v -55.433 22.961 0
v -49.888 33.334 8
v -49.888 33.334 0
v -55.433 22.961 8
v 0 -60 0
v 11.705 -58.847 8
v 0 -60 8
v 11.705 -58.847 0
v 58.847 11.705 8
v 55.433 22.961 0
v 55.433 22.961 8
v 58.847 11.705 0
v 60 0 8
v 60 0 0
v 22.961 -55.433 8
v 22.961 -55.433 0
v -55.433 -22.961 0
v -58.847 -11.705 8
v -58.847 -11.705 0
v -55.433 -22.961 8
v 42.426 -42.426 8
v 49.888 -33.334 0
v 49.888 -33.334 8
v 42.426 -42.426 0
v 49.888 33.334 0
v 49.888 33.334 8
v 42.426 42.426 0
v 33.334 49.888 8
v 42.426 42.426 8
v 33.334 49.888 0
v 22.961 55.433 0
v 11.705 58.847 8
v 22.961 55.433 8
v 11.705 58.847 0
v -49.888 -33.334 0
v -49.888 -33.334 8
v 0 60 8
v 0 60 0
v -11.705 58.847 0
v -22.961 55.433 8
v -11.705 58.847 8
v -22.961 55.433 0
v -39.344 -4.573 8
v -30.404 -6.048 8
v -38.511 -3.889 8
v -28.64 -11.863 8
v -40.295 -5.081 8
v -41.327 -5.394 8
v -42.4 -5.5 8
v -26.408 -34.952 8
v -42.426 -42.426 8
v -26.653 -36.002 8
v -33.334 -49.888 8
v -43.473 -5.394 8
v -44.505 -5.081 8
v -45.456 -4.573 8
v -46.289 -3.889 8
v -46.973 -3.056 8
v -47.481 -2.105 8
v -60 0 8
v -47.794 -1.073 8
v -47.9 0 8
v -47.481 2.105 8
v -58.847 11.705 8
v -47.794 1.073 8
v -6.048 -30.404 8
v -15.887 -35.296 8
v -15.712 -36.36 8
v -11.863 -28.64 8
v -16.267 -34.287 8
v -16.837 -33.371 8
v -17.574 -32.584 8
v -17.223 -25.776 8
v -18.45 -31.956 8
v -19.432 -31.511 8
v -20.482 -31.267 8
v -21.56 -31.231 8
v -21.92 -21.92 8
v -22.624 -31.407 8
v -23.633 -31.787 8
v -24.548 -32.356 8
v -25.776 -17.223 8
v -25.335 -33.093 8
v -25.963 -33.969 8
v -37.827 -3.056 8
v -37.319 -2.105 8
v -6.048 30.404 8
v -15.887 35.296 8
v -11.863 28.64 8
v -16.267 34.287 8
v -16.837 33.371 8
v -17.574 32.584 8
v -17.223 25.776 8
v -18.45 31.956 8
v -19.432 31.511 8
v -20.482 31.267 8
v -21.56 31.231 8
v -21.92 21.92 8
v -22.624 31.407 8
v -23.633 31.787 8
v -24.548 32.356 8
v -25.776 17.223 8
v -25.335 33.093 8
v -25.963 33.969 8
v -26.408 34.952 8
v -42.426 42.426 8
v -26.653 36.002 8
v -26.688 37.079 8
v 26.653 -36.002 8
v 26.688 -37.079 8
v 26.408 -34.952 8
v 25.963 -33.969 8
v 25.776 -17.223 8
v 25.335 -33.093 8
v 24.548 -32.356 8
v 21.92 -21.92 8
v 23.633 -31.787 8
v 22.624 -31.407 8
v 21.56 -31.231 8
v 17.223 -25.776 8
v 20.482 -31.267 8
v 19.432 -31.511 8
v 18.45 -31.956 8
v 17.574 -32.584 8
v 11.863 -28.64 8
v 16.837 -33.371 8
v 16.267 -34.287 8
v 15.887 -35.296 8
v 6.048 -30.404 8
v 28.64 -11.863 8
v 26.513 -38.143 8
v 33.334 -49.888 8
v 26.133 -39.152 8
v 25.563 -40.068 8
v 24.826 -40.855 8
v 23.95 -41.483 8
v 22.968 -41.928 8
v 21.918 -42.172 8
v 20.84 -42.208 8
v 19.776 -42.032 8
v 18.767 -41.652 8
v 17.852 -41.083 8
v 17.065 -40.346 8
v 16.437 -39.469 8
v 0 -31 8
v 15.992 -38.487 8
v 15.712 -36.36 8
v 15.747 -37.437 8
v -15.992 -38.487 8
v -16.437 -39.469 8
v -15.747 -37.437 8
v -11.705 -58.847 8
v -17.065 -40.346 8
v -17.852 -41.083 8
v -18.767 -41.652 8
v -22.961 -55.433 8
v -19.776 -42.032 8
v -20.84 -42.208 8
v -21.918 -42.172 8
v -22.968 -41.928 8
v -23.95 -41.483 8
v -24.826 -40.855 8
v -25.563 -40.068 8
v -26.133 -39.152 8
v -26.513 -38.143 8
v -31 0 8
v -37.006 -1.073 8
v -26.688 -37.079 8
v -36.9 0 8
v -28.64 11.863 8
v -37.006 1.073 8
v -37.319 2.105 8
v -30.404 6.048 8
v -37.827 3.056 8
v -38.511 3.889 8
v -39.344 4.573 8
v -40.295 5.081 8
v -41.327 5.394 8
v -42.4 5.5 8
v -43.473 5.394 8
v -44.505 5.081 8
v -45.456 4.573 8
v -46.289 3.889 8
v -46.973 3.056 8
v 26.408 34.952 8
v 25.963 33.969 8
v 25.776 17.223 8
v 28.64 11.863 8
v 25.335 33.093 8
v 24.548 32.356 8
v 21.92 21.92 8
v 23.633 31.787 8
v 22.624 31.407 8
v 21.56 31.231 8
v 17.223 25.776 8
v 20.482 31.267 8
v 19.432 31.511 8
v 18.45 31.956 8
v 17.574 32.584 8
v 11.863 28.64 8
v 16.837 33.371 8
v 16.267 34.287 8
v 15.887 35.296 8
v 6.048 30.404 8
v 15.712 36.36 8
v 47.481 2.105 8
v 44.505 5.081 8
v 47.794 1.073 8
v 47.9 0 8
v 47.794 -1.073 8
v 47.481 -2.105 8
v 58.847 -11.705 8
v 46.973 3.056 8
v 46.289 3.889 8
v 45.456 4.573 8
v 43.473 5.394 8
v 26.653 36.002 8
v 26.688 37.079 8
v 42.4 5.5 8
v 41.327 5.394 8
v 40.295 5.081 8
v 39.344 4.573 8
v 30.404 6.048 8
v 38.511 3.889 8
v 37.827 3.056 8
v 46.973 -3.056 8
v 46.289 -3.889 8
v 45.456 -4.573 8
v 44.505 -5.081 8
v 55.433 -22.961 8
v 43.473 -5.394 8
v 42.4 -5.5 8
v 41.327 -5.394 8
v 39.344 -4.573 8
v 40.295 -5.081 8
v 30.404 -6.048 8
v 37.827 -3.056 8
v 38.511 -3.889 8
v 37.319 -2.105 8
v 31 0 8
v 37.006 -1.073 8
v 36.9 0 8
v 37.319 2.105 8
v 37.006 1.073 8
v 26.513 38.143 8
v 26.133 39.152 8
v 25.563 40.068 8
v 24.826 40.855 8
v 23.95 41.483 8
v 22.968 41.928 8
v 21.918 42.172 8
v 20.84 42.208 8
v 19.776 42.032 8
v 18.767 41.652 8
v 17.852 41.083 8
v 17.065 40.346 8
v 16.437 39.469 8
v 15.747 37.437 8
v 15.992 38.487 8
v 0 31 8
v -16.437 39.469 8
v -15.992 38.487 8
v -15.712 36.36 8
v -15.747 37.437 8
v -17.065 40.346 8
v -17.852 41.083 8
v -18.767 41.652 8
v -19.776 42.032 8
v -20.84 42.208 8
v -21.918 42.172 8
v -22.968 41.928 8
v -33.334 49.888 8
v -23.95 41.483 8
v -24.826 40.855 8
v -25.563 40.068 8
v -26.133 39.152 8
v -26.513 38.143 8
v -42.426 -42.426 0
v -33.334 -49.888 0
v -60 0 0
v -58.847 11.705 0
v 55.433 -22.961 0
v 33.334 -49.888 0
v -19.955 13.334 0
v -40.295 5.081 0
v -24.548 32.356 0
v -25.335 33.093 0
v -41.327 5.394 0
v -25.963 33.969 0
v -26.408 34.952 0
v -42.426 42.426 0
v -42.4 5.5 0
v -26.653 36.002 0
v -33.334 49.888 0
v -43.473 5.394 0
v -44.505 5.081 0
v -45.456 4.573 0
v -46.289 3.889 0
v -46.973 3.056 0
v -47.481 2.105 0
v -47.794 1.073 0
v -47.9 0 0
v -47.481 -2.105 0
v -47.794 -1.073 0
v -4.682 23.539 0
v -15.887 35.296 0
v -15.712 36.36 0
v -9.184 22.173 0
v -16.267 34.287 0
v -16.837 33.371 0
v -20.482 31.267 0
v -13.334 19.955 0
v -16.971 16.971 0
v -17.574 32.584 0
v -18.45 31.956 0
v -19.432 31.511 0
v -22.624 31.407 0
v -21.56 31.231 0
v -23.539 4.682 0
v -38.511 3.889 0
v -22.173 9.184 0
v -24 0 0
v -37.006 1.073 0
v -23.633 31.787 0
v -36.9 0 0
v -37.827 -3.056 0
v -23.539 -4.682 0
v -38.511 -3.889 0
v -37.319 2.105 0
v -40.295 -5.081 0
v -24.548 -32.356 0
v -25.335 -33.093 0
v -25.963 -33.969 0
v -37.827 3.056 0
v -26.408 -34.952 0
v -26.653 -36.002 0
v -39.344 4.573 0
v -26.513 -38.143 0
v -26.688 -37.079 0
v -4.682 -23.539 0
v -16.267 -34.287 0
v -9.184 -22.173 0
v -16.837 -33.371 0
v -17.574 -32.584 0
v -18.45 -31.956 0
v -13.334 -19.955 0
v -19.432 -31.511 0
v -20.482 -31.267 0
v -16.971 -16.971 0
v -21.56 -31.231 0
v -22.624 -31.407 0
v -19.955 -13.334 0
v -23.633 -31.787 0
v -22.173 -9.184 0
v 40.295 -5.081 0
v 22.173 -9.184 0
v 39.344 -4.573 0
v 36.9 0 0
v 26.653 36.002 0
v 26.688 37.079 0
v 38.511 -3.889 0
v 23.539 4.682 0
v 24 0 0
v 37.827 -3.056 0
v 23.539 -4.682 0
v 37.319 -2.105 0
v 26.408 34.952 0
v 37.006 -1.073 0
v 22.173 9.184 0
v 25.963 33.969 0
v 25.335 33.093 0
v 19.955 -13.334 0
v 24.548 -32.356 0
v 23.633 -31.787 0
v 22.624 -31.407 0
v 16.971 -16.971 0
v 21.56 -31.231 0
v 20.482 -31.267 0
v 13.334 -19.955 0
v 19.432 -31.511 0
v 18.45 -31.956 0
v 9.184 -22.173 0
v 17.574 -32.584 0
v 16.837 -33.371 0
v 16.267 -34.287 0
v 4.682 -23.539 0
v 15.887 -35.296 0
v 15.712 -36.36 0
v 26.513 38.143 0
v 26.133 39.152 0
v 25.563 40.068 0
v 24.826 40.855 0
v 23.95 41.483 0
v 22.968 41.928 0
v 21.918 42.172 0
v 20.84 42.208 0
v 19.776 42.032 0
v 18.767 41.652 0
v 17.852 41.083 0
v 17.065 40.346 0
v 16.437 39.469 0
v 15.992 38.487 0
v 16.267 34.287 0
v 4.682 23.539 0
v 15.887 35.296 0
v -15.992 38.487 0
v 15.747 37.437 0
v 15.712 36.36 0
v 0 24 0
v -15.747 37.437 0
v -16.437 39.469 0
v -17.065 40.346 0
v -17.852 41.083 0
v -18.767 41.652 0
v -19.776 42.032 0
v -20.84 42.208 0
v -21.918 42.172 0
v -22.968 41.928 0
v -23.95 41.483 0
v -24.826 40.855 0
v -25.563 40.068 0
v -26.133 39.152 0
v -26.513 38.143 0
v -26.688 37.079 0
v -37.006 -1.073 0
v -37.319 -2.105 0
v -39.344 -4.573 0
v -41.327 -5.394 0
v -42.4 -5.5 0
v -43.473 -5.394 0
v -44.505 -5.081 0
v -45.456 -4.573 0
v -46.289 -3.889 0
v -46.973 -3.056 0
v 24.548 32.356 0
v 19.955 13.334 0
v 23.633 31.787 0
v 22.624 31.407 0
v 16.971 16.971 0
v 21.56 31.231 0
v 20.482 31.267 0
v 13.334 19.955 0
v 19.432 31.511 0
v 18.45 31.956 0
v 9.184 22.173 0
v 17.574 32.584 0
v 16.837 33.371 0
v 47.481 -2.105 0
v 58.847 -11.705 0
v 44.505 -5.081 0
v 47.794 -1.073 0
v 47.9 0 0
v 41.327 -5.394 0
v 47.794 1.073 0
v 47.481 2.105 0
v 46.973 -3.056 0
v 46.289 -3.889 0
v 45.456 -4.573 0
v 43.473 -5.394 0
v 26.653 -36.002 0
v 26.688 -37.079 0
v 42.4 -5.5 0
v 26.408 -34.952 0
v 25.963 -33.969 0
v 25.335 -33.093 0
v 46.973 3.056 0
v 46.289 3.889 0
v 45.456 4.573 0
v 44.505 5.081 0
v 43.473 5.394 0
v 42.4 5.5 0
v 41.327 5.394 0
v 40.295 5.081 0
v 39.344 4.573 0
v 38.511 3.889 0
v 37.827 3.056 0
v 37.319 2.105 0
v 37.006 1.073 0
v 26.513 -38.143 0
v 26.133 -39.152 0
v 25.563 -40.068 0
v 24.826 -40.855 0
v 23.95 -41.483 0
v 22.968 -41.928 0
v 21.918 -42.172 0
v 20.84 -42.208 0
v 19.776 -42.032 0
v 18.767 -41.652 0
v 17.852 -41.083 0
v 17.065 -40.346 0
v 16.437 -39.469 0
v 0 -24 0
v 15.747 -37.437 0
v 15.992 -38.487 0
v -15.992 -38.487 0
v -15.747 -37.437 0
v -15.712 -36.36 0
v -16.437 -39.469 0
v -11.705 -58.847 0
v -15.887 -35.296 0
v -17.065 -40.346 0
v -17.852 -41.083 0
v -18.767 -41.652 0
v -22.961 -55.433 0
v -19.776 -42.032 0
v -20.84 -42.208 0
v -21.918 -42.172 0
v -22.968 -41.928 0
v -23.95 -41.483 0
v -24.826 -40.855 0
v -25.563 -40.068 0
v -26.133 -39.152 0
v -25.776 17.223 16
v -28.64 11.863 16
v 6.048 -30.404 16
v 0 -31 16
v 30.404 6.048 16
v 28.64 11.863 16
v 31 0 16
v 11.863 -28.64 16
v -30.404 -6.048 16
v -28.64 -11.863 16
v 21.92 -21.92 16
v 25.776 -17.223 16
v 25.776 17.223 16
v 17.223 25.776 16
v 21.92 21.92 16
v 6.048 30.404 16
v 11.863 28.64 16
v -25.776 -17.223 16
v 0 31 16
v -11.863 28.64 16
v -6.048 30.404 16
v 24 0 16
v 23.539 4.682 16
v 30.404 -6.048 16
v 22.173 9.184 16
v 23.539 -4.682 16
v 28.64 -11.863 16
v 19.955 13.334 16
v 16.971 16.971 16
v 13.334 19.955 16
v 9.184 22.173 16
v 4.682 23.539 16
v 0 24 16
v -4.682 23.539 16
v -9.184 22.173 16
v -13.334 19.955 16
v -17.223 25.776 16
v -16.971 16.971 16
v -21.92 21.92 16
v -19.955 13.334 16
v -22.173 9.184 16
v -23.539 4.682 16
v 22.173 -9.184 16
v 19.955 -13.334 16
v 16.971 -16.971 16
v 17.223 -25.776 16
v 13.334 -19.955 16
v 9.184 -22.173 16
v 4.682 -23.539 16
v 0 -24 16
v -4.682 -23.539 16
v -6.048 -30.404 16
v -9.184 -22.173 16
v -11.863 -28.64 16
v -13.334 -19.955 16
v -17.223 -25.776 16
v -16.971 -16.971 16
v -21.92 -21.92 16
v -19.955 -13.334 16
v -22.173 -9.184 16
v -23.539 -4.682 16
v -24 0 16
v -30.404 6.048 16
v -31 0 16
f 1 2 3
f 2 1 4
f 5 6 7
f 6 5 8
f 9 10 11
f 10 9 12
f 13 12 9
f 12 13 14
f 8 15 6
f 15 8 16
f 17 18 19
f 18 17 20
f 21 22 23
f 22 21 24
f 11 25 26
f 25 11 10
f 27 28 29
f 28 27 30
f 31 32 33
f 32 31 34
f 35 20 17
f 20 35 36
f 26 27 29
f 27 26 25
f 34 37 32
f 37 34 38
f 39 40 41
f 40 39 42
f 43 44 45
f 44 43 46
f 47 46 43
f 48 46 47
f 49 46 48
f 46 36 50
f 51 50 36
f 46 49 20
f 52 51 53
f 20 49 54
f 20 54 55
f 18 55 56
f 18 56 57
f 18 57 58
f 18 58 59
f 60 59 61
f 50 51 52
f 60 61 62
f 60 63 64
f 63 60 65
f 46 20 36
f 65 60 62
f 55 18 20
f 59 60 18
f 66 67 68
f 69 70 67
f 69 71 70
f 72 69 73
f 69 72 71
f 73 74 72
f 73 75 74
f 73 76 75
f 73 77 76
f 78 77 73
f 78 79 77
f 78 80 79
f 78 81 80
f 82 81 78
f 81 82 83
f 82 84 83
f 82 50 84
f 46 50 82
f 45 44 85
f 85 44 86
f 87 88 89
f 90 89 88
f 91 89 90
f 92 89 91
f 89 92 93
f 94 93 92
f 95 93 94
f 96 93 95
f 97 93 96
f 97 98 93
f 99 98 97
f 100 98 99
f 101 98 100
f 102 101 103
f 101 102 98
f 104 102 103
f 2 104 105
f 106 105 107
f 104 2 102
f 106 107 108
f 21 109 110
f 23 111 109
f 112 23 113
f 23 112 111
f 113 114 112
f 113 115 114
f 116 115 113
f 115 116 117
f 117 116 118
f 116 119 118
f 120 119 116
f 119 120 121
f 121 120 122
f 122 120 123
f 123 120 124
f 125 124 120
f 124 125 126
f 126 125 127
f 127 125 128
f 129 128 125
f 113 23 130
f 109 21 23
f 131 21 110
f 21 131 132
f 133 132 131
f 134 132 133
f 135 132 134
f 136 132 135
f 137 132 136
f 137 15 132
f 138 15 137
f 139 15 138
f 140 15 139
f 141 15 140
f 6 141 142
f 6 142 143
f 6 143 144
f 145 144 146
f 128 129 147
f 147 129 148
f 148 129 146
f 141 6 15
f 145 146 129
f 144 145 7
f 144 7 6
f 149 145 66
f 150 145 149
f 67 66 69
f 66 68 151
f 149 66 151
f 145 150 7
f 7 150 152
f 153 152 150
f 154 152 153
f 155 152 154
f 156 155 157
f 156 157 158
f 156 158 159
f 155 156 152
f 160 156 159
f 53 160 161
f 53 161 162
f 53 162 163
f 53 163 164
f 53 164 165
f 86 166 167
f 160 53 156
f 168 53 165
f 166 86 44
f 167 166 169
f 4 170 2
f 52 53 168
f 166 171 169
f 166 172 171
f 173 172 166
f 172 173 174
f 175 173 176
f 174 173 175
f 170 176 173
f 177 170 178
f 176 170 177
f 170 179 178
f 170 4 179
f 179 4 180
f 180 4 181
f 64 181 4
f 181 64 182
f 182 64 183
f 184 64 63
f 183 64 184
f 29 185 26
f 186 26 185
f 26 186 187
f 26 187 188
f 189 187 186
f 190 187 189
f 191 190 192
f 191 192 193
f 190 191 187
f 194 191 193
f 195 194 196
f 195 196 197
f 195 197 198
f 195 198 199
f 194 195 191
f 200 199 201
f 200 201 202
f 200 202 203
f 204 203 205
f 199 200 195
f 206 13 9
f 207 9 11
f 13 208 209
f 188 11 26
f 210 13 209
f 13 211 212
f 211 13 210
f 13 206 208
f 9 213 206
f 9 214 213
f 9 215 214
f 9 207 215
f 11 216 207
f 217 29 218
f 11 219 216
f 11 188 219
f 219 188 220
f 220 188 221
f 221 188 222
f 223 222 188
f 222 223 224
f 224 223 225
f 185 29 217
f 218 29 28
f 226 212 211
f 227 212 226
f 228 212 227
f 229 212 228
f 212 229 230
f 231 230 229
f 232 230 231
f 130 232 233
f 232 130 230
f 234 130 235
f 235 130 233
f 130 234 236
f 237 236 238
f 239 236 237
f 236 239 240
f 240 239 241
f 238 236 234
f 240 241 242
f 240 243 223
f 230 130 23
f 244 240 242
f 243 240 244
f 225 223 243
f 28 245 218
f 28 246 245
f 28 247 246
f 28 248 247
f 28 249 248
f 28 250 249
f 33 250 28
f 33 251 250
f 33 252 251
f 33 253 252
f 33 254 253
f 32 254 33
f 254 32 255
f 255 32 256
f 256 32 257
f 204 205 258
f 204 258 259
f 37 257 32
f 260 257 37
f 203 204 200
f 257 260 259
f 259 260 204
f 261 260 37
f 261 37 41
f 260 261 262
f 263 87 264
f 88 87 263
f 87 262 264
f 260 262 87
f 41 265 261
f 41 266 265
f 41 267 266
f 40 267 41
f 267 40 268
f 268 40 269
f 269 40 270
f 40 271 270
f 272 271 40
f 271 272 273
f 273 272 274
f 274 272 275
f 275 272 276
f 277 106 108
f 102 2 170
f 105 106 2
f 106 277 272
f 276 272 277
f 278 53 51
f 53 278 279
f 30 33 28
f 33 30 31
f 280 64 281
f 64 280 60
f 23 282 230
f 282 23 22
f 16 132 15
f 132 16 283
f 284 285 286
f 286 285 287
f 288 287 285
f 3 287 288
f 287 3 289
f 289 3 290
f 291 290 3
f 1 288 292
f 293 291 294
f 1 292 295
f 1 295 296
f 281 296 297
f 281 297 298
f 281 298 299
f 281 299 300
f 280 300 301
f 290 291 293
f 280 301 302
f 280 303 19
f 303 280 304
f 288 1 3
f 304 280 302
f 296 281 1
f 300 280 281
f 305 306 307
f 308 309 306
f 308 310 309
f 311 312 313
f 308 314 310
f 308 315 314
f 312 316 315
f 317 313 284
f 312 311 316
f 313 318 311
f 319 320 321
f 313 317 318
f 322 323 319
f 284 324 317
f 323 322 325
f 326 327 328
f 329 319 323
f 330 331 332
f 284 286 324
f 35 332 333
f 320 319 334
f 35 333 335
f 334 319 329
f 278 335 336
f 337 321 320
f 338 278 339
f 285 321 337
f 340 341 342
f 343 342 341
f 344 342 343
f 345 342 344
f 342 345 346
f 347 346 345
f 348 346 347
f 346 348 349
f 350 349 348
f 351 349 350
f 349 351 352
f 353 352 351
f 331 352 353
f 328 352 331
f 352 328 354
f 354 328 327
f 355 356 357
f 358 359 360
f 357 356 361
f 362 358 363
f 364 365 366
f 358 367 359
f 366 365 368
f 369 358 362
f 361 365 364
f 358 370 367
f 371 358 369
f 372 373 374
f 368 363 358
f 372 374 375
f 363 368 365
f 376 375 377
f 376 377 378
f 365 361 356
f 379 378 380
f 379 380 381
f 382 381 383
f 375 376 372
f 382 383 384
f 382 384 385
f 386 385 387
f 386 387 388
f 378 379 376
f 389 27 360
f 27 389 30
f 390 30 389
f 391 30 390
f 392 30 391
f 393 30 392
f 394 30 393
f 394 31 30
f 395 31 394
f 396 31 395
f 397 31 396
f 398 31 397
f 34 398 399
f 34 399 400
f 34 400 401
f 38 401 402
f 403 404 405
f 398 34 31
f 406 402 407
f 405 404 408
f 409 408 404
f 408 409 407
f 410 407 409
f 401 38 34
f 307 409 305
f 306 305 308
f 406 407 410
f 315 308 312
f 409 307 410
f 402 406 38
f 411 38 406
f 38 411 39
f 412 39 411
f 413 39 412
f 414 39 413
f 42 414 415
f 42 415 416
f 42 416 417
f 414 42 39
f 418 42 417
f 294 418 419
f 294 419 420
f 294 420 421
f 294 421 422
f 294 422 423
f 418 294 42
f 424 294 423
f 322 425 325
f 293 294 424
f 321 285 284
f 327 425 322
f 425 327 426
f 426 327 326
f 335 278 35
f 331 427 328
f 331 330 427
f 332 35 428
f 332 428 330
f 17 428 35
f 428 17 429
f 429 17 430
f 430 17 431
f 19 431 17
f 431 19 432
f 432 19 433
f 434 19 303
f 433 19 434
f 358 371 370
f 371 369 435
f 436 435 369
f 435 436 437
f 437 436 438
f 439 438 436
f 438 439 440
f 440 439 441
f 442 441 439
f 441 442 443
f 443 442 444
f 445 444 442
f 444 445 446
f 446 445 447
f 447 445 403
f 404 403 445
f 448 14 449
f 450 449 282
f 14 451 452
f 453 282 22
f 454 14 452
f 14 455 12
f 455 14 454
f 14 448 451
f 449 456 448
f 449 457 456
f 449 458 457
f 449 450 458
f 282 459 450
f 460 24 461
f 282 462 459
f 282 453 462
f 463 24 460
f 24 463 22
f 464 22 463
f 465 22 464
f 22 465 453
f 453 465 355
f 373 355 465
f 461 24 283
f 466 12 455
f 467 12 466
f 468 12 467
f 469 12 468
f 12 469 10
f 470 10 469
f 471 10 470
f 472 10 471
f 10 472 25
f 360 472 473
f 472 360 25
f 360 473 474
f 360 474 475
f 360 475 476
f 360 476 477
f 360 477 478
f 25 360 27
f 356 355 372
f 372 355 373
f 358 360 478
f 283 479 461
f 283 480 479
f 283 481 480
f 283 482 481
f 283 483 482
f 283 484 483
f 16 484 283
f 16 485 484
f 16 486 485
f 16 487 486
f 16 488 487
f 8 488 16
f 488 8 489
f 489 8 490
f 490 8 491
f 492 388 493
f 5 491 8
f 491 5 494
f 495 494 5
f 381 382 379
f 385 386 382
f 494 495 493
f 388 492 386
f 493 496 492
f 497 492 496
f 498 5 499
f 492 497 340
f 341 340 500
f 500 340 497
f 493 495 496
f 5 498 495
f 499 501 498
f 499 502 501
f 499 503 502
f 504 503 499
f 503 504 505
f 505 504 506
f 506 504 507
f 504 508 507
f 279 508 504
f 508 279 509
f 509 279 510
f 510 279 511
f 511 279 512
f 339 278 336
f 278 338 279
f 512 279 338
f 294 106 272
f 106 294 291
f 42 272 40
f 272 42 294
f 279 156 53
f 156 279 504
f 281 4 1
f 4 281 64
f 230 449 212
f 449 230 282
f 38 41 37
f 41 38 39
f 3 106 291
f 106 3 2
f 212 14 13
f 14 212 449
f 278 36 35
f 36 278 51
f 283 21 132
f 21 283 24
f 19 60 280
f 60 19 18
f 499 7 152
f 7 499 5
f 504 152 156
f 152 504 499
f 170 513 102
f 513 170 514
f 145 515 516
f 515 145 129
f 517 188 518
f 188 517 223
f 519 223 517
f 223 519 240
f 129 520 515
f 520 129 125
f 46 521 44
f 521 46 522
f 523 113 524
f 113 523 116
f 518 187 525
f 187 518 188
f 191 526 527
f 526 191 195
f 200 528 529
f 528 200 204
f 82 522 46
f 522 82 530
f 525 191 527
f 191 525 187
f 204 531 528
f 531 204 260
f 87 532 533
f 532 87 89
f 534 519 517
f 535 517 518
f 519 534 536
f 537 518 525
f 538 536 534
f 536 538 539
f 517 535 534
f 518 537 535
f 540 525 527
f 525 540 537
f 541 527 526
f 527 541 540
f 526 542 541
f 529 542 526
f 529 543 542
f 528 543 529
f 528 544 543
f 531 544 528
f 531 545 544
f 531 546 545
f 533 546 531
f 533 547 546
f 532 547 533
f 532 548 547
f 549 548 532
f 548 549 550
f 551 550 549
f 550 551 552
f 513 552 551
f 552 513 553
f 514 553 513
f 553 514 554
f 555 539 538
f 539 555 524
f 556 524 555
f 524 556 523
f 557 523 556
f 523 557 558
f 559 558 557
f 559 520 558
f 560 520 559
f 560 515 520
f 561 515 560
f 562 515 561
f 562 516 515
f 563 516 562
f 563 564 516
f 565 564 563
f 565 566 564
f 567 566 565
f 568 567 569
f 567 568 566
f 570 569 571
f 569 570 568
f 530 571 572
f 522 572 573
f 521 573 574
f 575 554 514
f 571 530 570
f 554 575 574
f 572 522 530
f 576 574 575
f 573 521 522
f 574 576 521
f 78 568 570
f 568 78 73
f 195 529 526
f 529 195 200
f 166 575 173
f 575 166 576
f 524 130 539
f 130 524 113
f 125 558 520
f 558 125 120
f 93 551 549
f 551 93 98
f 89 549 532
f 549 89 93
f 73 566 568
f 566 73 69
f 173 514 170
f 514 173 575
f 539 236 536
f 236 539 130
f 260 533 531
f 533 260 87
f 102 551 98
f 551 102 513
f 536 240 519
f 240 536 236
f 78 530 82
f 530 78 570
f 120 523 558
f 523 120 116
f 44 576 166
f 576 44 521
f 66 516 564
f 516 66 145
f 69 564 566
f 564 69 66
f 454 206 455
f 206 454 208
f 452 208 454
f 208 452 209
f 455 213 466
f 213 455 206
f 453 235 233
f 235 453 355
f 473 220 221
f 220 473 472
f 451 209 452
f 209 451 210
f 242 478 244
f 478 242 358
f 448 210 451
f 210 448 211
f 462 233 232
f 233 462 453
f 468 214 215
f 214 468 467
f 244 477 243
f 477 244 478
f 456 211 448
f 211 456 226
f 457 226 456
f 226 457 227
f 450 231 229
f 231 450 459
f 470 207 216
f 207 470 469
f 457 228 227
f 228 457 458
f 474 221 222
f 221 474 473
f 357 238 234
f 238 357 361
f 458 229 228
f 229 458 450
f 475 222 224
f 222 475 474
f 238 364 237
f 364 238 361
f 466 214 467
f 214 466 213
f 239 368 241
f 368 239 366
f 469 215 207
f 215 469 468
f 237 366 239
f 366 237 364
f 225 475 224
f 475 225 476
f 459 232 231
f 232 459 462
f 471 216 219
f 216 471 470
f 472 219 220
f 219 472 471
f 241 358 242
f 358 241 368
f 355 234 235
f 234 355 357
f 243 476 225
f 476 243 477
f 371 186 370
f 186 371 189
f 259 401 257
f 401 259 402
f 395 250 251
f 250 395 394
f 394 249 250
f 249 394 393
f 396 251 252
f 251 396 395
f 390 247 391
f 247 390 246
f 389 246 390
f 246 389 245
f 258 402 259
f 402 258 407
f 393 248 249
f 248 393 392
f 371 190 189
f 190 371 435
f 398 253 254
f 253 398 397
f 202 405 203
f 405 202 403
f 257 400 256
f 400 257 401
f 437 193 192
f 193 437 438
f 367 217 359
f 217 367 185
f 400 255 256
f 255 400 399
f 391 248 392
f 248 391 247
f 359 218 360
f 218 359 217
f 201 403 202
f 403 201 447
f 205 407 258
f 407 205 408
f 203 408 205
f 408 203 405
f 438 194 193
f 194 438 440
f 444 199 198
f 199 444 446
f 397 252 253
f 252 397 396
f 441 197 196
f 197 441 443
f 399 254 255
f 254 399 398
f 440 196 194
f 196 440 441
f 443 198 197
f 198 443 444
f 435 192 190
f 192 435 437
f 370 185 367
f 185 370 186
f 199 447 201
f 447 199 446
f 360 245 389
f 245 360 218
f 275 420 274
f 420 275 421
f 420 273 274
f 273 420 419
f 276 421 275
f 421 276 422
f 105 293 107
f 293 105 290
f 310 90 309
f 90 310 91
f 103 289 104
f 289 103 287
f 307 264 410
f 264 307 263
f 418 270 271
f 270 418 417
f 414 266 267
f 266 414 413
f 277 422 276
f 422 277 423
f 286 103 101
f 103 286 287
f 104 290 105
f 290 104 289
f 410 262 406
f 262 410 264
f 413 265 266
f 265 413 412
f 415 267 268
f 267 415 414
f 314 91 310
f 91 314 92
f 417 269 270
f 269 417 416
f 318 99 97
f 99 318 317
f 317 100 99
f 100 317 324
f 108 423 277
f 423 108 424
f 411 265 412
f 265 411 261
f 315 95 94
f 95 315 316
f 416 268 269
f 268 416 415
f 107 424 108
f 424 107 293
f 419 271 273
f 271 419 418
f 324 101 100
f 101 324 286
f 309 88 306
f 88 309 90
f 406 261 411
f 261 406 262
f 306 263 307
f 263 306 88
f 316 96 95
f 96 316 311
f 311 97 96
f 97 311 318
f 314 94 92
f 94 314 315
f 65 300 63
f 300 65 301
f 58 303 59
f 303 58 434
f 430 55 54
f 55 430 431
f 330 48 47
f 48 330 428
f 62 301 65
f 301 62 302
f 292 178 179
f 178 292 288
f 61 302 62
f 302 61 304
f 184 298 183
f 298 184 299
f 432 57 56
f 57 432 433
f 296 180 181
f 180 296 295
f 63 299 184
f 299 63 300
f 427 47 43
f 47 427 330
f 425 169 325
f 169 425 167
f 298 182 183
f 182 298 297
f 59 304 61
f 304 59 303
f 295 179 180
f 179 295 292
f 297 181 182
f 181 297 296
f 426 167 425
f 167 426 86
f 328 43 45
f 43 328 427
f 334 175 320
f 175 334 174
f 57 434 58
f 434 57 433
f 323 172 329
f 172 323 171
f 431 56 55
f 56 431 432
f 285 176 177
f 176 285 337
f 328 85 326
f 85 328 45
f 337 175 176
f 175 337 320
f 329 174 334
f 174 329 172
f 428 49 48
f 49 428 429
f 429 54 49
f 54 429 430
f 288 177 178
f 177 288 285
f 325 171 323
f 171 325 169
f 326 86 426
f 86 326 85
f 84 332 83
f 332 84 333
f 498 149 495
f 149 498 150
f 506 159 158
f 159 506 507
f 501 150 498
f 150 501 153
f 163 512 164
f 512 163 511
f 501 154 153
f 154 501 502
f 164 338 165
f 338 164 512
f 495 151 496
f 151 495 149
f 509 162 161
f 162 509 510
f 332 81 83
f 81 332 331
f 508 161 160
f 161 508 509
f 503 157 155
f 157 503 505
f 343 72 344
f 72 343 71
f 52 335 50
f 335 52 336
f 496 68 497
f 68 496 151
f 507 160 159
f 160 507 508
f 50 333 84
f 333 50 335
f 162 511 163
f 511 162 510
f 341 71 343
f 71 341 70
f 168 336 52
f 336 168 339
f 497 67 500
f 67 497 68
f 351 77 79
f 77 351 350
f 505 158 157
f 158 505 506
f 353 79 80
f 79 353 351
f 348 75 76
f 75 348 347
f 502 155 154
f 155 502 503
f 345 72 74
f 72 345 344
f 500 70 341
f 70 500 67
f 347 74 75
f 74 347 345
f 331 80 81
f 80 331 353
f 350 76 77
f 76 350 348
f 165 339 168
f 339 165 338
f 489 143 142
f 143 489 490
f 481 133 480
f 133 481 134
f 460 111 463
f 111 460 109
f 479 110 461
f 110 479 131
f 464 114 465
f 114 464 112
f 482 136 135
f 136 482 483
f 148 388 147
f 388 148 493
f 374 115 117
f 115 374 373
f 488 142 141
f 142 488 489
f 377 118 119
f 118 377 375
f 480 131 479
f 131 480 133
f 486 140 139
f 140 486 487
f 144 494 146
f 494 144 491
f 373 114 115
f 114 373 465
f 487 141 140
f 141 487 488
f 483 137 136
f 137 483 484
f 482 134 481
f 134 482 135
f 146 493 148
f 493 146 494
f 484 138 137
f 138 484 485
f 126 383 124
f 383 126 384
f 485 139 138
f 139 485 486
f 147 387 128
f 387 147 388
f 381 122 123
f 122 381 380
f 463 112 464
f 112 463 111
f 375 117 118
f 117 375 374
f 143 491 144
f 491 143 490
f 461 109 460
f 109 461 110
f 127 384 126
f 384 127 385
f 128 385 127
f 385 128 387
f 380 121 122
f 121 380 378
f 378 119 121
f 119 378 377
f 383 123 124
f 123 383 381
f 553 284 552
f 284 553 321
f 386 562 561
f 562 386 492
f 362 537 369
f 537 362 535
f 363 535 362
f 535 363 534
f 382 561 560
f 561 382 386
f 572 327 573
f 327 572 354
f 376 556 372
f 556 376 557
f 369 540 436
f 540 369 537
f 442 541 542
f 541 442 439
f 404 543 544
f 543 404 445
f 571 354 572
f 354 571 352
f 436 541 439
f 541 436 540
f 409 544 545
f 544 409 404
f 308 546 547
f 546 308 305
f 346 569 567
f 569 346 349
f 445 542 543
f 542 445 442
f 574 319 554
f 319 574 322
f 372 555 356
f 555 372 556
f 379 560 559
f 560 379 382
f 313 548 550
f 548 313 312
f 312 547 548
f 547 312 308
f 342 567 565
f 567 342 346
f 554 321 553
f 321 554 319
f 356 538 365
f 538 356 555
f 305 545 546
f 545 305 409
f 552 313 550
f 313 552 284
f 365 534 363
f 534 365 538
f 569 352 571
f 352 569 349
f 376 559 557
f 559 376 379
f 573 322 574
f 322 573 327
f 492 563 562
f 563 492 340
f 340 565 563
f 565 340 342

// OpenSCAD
$fn = 32;

// ----------------------------------------------------------------------
// Bolt-circle flange: 120 mm outside, 6 bolt holes, bore 48 mm
// ----------------------------------------------------------------------

// --- parameters (mm) ---
flange_d = 120;           // flange outside diameter
flange_t = 8;             // flange thickness
bolts = 6;                // number of bolt holes
bolt_d = 11;              // bolt clearance
bolt_r = 42.4;            // bolt circle radius
bore_d = 48;              // centre bore
hub_d = 62;               // raised hub diameter
hub_h = 8;                // raised hub height

module body() {
  cylinder(h = flange_t, d = flange_d);
  /* raised hub, sunk 1 mm into the flange */
  translate([0, 0, flange_t - 1]) cylinder(h = hub_h + 1, d = hub_d);
}

difference() {
  body();
  /* bolt circle */
  for (i = [0 : bolts - 1]) rotate([0, 0, i * 360 / bolts]) translate([bolt_r, 0, -1]) cylinder(h = flange_t + hub_h + 3, d = bolt_d);
  translate([0, 0, -1]) cylinder(h = flange_t + hub_h + 3, d = bore_d);
}
